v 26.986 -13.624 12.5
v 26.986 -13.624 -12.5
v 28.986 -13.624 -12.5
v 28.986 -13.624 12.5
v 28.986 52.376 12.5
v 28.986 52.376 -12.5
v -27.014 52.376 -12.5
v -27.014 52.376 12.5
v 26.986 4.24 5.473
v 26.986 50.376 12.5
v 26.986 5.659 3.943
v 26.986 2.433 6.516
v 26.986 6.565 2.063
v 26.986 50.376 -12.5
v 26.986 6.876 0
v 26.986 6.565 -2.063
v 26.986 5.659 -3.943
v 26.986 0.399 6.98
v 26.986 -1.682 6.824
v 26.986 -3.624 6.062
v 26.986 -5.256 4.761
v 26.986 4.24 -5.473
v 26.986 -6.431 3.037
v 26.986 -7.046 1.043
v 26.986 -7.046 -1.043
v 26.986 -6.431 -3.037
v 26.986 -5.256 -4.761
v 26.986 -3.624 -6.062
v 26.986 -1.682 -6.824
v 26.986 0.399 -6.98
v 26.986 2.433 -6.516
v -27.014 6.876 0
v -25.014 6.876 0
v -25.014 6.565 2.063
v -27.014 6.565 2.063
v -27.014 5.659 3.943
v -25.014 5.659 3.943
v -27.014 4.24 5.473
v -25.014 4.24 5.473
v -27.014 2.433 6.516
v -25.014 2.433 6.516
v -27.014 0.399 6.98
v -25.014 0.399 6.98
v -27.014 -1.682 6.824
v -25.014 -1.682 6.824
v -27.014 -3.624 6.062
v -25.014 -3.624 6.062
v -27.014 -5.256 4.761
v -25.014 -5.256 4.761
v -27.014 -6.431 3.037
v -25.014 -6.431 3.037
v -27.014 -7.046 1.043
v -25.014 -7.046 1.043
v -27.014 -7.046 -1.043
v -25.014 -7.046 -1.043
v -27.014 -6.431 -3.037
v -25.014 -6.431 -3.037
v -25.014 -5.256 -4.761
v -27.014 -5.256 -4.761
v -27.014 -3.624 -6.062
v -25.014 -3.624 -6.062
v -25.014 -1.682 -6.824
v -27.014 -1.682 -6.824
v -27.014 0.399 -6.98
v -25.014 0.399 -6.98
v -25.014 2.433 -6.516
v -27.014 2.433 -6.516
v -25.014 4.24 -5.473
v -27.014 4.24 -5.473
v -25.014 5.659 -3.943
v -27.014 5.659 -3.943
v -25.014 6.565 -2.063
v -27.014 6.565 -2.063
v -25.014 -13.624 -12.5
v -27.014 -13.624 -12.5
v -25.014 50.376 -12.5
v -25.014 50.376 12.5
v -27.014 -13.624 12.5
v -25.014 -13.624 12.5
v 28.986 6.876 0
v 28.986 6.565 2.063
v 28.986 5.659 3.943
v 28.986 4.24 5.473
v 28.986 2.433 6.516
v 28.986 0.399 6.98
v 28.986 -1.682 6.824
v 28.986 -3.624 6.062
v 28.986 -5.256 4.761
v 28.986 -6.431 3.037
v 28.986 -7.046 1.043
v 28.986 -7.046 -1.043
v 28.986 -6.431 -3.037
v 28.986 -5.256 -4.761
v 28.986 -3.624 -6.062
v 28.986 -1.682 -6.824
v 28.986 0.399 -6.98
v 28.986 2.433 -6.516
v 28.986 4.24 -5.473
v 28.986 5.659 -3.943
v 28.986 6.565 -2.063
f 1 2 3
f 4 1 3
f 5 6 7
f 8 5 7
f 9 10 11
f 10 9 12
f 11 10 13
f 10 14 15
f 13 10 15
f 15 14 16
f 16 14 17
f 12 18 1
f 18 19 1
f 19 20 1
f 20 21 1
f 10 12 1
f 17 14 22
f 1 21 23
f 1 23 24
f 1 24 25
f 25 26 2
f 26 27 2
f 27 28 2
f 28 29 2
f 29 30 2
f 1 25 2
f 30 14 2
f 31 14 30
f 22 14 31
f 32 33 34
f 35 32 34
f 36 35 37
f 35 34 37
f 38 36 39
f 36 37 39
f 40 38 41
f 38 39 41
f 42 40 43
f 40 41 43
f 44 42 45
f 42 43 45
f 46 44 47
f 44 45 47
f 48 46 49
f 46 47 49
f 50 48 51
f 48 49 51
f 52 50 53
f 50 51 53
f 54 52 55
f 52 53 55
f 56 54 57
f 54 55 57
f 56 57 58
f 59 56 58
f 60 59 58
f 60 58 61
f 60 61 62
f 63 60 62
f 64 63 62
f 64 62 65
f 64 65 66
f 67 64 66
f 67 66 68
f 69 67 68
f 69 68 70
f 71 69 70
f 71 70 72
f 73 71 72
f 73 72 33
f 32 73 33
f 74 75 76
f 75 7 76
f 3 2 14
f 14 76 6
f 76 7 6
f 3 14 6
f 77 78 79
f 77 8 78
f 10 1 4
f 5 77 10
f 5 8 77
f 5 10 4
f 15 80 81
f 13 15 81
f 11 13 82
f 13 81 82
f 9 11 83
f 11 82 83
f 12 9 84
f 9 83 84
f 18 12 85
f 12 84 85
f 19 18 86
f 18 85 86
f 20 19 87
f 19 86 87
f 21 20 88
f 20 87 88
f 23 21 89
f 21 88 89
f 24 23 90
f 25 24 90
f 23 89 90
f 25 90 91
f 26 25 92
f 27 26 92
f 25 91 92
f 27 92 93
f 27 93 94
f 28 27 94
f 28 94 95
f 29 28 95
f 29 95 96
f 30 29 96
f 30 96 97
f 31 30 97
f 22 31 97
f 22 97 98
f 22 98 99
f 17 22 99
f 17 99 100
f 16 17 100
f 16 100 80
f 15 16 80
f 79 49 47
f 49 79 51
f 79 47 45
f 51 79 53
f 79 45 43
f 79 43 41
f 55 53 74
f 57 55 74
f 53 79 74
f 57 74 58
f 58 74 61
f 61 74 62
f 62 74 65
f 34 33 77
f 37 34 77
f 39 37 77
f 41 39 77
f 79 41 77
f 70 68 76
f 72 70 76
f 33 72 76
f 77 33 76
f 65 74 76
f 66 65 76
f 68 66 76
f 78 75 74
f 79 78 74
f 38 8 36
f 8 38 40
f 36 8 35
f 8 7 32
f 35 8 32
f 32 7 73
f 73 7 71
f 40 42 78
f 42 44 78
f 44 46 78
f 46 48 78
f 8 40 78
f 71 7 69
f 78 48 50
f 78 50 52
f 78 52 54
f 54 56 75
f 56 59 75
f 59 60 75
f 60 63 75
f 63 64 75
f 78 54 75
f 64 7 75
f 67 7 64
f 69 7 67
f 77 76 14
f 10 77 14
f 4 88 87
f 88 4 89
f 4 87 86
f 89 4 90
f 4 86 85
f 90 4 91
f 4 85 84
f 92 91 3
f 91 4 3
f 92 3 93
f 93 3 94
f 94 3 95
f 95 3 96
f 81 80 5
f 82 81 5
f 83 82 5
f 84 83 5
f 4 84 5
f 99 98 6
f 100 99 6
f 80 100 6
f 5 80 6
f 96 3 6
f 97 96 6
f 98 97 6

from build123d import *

# Parameters (mm, degrees)
PAD_DEPTH    = 25
SKETCH001_R  = 7
POCKET_DEPTH = 56.001


with BuildPart() as part:
    # Sketch → Pad (new body)
    with BuildSketch(Plane.XY):
        Polygon((-27.014097, -10.624443), (-25.014097, -10.624443), (-25.014097, 53.375557), (26.985903, 53.375557), (26.985903, -10.624443), (28.985903, -10.624443), (28.985903, 55.375557), (-27.014097, 55.375557), align=None)
    extrude(amount=PAD_DEPTH)

    # Sketch001 (on Face6 of Pad) → Pocket (cut, through all)
    with BuildSketch(Plane.YZ.offset(28.985903)):
        with Locations((2.875557, 12.5)):
            Circle(SKETCH001_R)
    extrude(amount=-POCKET_DEPTH, mode=Mode.SUBTRACT)


with BuildPart() as part_1:
    # Body placement: moved
    add(part.part.moved(Location((0, -3, -12.5))))


solid = part_1.part
